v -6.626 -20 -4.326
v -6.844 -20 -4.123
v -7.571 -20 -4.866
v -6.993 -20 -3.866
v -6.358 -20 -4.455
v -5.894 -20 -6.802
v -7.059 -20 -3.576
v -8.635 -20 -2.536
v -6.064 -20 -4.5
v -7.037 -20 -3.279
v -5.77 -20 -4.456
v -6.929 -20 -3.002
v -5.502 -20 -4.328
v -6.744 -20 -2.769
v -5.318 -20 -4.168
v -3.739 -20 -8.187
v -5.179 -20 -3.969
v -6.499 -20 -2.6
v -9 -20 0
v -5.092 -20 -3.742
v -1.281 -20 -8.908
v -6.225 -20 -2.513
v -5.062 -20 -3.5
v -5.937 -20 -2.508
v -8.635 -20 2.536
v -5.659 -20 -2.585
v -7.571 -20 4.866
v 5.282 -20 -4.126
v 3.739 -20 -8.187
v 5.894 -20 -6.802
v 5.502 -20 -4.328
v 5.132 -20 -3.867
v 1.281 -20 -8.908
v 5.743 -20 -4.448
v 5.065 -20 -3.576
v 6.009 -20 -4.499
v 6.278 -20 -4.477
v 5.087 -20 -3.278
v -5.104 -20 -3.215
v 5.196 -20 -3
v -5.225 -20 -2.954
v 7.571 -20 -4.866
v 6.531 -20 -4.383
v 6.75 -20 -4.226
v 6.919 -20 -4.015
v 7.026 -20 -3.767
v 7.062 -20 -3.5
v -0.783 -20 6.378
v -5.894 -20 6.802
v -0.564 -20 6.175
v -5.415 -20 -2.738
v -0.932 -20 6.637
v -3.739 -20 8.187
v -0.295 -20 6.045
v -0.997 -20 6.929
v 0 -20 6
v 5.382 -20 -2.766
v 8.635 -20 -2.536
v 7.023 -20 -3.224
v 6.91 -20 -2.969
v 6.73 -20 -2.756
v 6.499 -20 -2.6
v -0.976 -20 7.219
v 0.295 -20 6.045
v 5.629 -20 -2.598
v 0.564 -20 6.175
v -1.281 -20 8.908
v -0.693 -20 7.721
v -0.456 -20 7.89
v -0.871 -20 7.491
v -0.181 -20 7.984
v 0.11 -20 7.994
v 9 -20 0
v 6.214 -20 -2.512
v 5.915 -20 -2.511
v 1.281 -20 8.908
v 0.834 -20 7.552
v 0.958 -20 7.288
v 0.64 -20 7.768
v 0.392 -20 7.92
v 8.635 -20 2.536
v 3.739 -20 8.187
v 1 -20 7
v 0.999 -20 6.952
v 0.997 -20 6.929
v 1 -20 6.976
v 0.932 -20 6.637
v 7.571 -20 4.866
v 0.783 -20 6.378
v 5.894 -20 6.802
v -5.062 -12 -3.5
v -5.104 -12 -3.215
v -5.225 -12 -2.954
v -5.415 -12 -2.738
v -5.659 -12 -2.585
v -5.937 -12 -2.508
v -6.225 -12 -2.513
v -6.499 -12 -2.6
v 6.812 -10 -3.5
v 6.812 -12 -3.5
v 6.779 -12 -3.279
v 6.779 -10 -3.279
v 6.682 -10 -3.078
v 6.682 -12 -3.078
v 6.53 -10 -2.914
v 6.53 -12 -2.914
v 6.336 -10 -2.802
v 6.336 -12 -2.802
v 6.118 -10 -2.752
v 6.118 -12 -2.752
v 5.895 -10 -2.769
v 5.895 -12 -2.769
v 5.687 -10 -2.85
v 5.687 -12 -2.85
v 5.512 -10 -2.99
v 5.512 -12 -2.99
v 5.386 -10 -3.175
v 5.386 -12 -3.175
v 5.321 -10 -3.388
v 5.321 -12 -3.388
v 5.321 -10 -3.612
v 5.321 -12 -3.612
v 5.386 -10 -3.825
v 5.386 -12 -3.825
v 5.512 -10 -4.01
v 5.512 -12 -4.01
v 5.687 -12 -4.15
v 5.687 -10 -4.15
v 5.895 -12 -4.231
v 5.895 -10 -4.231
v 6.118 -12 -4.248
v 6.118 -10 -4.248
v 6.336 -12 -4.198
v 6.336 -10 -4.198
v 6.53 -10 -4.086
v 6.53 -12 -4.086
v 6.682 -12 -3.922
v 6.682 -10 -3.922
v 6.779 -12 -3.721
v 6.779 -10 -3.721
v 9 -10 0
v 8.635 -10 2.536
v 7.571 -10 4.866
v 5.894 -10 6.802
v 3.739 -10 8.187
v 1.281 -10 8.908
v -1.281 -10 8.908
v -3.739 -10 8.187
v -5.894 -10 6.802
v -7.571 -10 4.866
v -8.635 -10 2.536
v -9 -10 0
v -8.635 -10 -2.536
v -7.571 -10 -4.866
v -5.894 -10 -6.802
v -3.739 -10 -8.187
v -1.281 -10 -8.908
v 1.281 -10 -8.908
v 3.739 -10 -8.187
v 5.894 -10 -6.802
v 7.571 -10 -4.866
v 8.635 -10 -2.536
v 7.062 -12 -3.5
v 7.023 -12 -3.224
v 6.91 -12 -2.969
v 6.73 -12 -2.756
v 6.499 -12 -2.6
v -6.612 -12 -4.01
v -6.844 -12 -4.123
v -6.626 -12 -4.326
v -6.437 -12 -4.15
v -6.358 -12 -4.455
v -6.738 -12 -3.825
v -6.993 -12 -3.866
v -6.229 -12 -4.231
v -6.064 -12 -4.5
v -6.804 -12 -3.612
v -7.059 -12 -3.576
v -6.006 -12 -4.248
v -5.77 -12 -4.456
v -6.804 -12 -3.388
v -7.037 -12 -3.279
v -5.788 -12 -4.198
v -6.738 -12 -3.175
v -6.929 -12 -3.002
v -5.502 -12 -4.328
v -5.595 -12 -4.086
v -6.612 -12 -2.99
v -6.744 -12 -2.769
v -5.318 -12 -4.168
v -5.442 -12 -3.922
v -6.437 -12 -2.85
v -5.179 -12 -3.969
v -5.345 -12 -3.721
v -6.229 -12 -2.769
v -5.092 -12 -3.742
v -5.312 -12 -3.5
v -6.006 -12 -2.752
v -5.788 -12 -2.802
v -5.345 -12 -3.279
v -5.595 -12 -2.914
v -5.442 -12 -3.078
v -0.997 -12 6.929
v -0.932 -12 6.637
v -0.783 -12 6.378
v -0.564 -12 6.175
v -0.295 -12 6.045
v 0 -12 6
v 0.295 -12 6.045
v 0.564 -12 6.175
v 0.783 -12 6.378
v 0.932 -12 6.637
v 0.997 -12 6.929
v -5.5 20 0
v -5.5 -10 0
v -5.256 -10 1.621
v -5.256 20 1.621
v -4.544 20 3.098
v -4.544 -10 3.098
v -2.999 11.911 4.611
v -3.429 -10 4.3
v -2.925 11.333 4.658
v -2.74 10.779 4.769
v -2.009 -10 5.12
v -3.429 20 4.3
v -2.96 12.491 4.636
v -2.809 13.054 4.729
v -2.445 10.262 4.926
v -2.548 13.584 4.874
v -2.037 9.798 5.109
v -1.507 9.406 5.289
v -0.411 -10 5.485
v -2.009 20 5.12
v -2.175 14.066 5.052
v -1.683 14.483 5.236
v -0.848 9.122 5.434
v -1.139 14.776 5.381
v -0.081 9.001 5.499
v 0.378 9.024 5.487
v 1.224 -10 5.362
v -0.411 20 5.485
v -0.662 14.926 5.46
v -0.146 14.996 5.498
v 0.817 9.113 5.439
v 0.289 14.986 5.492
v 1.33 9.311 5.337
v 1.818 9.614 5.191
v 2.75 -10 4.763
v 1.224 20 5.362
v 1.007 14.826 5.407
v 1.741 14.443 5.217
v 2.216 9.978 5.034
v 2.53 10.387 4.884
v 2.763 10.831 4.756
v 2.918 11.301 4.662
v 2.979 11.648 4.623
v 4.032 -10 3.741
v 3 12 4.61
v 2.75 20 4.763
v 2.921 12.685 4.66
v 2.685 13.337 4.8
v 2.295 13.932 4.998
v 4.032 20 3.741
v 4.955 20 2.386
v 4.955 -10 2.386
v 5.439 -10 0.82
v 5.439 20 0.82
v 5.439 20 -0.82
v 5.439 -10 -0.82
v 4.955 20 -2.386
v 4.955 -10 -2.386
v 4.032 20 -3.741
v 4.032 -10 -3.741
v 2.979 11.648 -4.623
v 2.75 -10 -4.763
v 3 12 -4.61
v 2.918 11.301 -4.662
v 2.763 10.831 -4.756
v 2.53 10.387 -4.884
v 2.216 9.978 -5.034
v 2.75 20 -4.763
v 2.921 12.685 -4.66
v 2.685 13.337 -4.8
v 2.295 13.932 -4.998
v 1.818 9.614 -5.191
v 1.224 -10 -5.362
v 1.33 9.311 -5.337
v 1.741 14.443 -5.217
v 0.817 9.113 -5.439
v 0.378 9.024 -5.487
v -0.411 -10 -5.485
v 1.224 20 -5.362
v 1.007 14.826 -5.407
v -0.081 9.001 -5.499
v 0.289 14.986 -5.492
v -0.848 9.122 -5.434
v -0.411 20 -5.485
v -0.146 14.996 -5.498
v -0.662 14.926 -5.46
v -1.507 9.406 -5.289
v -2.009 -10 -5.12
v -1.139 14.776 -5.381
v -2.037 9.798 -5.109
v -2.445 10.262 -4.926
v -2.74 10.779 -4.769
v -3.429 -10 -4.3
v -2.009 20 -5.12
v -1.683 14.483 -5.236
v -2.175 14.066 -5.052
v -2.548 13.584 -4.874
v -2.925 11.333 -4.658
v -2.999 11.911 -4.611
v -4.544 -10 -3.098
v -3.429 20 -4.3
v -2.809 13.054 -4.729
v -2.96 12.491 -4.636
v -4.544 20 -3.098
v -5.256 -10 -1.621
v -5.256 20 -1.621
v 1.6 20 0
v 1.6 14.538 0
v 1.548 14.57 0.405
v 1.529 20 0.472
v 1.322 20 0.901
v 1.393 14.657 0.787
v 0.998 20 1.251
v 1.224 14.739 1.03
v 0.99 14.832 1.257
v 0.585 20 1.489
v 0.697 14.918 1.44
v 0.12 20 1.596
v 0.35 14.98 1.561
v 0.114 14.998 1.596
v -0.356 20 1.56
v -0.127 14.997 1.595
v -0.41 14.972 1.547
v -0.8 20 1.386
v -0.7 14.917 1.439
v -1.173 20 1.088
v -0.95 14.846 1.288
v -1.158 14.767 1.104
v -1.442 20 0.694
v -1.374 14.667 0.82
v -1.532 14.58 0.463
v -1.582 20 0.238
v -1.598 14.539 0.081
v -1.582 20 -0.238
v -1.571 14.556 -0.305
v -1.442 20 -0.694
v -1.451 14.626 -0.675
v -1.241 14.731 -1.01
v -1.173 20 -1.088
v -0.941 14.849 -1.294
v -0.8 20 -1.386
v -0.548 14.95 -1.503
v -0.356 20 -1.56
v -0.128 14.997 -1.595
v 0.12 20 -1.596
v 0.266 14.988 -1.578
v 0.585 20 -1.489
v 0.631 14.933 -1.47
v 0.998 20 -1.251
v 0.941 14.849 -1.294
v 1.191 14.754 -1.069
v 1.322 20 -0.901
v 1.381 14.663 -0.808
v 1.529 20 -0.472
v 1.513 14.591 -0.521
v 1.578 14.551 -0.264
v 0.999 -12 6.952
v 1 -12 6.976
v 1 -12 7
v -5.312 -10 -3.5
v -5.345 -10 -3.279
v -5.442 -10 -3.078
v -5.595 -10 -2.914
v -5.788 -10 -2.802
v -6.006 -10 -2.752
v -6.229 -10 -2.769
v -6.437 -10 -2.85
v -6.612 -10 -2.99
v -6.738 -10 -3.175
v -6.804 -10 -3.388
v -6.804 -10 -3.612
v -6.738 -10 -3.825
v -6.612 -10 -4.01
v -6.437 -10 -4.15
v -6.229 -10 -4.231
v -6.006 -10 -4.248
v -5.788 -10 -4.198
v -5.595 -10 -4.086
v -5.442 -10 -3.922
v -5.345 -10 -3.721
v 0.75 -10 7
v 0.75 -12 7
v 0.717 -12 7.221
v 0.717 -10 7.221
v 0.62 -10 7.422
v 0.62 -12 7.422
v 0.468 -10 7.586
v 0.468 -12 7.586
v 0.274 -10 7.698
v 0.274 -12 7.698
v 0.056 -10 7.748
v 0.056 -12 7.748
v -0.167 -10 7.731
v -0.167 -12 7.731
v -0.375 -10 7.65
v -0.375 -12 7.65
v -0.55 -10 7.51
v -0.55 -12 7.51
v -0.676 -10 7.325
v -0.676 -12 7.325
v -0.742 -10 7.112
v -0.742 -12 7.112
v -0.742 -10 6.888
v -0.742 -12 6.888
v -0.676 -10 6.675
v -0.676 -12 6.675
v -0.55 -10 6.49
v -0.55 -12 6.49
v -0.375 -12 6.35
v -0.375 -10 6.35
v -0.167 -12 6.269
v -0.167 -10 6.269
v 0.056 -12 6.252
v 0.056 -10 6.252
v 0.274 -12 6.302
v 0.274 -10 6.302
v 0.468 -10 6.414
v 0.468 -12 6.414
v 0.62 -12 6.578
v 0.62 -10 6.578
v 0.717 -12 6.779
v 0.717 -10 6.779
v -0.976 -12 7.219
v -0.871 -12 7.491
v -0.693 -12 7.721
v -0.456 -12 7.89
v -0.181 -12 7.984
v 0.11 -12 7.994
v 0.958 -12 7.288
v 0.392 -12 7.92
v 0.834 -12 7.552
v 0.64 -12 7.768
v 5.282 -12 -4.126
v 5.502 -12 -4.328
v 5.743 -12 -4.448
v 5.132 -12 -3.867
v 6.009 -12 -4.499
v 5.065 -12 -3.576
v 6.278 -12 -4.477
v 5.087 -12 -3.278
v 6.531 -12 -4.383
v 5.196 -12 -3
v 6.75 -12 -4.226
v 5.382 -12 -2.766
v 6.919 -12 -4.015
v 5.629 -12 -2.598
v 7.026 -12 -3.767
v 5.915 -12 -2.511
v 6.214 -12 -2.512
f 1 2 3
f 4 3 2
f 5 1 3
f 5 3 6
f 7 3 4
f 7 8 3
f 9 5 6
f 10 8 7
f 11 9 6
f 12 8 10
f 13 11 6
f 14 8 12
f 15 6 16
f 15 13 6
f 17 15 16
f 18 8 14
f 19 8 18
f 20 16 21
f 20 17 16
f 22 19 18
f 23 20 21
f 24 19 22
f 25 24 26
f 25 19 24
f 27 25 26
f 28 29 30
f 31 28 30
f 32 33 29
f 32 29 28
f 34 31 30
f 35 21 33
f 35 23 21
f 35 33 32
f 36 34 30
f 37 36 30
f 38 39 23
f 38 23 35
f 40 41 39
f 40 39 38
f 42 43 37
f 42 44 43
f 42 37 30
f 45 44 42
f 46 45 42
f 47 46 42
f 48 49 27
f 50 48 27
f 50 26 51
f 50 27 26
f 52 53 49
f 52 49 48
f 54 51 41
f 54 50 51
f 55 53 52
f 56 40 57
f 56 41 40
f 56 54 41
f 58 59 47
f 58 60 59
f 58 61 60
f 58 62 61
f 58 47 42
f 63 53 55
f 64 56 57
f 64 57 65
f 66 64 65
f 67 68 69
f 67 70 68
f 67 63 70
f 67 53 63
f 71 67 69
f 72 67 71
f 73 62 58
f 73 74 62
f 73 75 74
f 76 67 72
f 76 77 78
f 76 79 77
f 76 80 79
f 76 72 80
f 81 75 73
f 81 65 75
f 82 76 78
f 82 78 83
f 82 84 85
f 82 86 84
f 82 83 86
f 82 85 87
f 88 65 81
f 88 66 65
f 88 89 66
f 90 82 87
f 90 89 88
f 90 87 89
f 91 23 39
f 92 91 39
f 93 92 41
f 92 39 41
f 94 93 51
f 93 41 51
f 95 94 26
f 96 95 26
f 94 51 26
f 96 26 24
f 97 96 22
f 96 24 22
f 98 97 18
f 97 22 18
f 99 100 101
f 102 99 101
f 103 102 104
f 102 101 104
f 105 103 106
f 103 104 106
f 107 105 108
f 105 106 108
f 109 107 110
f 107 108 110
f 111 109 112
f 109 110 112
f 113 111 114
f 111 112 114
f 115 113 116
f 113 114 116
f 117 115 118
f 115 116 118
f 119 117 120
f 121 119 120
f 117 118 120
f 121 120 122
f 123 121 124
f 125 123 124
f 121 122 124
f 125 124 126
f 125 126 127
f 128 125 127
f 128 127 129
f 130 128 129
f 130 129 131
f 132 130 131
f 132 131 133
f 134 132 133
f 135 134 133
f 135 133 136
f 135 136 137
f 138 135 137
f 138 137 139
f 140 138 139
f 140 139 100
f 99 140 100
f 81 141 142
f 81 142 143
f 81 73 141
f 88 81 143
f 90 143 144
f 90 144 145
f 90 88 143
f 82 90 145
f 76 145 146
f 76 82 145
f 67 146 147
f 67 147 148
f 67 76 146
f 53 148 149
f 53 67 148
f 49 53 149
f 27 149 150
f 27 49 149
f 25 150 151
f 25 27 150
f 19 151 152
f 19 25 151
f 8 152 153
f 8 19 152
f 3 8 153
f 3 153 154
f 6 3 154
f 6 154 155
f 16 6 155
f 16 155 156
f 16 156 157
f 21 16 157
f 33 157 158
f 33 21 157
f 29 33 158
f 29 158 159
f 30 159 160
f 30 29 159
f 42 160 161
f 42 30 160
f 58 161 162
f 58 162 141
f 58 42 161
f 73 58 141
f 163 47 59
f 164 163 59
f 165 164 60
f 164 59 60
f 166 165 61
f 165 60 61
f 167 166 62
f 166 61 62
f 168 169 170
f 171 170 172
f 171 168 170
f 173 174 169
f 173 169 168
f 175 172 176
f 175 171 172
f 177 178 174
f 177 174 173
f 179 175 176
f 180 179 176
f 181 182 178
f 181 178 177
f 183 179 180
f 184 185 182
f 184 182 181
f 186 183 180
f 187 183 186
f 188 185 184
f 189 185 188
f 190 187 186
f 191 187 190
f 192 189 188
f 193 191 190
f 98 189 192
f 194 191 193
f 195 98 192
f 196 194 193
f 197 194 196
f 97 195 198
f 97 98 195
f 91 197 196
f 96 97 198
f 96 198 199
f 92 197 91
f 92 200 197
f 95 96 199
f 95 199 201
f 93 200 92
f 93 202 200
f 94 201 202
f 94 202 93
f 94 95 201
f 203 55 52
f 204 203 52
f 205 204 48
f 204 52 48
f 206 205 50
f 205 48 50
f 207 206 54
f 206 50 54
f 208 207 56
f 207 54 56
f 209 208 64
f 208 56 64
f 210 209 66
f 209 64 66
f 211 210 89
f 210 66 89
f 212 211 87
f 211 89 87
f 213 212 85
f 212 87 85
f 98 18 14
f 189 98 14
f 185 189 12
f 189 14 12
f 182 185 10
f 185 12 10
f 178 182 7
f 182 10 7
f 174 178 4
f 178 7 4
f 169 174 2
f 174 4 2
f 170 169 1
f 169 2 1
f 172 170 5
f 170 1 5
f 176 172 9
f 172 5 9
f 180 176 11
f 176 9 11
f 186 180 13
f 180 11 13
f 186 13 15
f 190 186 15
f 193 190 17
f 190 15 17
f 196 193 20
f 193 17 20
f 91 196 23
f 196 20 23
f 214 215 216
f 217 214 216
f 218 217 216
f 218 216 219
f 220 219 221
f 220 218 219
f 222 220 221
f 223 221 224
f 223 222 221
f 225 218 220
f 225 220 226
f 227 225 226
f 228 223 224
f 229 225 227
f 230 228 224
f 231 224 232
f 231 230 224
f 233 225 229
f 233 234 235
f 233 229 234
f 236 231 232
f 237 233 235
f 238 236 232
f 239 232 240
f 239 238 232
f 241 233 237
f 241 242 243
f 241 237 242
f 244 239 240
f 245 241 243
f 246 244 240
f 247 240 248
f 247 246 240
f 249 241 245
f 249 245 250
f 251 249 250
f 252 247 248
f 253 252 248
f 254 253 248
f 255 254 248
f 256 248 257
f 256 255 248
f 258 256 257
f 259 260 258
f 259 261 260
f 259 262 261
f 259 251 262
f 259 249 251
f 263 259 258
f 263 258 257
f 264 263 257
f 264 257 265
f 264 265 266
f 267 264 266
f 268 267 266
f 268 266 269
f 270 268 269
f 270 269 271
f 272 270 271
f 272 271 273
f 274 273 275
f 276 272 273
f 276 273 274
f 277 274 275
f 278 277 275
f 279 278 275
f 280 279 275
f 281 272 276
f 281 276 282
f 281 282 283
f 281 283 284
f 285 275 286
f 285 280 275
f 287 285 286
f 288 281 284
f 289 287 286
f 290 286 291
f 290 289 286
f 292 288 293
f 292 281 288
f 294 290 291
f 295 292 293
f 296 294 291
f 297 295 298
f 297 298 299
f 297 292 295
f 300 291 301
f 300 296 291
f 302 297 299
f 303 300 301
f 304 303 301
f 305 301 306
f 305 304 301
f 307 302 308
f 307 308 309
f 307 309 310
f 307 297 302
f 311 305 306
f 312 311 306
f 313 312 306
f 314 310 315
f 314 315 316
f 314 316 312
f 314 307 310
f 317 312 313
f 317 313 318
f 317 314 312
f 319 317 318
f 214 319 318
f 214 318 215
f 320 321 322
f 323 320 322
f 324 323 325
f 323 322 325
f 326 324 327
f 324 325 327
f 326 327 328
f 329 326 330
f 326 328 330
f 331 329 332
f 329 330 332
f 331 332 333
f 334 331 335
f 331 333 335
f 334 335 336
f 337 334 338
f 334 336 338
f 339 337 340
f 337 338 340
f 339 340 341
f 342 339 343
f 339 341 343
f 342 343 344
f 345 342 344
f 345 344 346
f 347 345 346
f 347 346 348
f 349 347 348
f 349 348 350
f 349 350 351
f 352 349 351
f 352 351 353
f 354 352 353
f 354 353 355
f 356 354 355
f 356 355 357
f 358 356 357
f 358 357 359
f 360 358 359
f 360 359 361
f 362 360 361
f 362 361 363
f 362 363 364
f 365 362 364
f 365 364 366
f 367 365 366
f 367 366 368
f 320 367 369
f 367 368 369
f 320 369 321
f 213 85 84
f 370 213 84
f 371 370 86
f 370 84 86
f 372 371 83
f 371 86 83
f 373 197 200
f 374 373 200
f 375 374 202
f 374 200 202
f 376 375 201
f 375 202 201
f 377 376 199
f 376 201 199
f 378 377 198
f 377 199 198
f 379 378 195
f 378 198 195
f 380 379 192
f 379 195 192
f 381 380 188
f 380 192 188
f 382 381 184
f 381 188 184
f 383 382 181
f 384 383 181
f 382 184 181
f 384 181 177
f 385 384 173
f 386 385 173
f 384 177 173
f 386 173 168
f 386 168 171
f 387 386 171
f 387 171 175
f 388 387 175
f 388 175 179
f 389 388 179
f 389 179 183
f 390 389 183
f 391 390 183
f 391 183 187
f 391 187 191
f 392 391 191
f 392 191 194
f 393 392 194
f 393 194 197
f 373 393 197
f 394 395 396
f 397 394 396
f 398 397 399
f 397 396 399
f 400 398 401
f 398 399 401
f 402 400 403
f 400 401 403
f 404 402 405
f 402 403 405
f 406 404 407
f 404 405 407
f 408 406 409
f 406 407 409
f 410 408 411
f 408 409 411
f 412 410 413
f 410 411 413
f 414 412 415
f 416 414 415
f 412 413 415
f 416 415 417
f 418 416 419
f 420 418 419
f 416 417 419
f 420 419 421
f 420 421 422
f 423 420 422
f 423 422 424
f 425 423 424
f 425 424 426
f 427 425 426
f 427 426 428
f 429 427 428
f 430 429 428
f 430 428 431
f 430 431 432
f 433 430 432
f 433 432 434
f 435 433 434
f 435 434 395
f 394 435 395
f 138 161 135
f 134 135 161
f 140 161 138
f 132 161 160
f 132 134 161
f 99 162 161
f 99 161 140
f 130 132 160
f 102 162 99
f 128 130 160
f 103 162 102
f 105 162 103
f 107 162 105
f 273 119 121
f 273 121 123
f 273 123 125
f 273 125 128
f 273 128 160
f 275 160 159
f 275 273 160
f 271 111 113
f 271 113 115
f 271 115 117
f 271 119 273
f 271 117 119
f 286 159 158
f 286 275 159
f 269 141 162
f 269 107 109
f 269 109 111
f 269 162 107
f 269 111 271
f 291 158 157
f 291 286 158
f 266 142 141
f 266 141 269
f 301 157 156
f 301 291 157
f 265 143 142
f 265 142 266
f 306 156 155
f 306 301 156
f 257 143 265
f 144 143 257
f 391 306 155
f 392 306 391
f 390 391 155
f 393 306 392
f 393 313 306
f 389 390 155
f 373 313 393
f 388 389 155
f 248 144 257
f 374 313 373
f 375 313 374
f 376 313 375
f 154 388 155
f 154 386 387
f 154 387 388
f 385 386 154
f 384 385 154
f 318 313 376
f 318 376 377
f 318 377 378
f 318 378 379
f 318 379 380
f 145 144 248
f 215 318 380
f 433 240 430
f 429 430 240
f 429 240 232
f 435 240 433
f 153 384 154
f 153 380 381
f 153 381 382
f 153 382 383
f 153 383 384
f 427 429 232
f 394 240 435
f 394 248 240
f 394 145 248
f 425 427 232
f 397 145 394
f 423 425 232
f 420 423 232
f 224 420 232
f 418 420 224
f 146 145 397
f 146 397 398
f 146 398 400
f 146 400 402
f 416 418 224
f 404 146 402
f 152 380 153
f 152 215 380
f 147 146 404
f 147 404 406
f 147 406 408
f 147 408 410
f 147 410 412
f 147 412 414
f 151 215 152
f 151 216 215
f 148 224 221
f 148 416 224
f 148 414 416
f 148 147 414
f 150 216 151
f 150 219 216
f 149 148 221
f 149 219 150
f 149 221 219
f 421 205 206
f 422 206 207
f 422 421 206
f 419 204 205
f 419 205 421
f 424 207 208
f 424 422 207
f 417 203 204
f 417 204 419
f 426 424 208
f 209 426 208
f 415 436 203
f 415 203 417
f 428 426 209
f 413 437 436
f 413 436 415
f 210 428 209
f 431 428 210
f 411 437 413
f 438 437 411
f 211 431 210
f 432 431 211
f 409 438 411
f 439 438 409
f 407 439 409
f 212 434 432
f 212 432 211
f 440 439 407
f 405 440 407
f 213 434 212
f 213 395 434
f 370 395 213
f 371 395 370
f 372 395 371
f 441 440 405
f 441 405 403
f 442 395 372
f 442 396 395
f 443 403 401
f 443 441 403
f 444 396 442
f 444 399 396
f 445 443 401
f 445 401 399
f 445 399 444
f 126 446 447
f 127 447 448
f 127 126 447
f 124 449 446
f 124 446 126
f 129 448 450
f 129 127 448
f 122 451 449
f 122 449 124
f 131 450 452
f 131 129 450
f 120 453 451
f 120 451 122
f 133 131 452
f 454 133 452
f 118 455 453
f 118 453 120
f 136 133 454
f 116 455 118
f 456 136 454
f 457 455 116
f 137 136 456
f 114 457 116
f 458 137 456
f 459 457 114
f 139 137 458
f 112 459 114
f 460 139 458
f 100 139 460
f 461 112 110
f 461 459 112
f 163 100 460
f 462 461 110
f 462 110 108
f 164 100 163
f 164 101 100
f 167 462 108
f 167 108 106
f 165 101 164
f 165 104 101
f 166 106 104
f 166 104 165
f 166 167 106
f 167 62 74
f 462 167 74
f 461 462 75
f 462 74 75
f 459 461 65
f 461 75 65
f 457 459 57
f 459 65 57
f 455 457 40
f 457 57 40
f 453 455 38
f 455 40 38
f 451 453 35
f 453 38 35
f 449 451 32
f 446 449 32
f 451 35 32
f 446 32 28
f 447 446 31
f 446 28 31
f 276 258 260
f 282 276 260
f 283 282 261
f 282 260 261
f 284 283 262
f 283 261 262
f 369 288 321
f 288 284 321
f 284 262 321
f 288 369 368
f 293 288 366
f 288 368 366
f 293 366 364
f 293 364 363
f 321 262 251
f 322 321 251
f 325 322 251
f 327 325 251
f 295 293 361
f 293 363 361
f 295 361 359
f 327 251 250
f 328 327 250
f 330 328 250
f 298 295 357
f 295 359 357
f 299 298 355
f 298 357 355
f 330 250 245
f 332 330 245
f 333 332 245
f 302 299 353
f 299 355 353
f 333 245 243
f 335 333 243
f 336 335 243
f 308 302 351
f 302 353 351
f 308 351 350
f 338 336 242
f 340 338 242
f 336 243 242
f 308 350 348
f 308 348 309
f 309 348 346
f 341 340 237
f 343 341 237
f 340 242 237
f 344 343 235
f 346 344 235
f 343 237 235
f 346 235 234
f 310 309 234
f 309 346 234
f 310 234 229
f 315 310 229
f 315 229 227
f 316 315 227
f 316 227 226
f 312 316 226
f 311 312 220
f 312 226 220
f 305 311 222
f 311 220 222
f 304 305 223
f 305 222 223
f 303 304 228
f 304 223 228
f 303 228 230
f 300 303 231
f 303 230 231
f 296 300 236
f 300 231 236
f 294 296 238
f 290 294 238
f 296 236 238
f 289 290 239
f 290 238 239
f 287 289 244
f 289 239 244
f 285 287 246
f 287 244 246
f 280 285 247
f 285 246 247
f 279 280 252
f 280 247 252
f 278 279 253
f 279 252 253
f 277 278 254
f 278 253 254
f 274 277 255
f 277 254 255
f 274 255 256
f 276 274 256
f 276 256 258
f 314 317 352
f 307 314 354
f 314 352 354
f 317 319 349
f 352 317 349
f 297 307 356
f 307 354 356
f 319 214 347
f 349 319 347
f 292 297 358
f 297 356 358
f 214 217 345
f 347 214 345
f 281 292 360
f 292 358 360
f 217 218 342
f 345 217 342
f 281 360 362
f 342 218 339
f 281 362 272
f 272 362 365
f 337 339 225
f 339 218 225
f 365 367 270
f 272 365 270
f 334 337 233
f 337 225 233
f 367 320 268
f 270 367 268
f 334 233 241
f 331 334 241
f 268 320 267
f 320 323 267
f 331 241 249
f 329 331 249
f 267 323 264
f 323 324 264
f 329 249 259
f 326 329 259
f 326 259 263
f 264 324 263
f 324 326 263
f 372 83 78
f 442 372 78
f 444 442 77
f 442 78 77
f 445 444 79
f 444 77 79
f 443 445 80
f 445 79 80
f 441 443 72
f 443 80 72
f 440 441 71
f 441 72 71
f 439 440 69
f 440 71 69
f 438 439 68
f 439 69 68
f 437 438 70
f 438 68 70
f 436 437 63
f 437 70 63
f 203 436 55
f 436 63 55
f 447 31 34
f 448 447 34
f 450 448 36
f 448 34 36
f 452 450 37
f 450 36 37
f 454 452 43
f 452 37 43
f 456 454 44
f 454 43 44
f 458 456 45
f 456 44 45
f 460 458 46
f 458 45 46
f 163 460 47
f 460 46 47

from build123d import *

# Parameters (mm, degrees)
F0_R      = 9
F1_DEPTH  = 20
F2_R      = 0.75
F3_DEPTH  = 8
F4_R      = 9
F4_R_2    = 5.5
F5_DEPTH  = 30
F6_DEPTH  = 10
F7_R      = 3
F8_DEPTH  = 12.5
F10_D     = 3.2
F10_DEPTH = 7.25
F10_TIP   = 0.9613769904


with BuildPart() as f1:
    # F0 (on Front) → F1 (new body, symmetric)
    with BuildSketch(Plane.XZ):
        Circle(F0_R)
    extrude(amount=F1_DEPTH, both=True)

    # F2 (on face) → F3 (cut)
    with BuildSketch(Plane.XZ.offset(20)):
        with BuildLine():
            ThreePointArc((1, 7), (-0.0357371137, 7.9993612253), (-0.9974457174, 6.9285714286))
            ThreePointArc((-0.9974457174, 6.9285714286), (0, 6), (0.9974457174, 6.9285714286))
            ThreePointArc((0.9974457174, 6.9285714286), (0.9993612253, 6.9642628863), (1, 7))
        make_face()
        with Locations((0, 7)):
            Circle(F2_R, mode=Mode.SUBTRACT)
        with BuildLine():
            ThreePointArc((-5.0621778265, -3.5), (-5.5315479655, -2.6523963481), (-6.4990417278, -2.6004723841))
            ThreePointArc((-6.4990417278, -2.6004723841), (-6.9282032303, -4), (-5.5015960104, -4.3280990445))
            ThreePointArc((-5.5015960104, -4.3280990445), (-5.178837061, -3.9687313644), (-5.0621778265, -3.5))
        make_face()
        with Locations((-6.0621778265, -3.5)):
            Circle(F2_R, mode=Mode.SUBTRACT)
        with BuildLine():
            ThreePointArc((7.0621778265, -3.5), (6.9097814784, -2.969370139), (6.4990417278, -2.6004723841))
            ThreePointArc((6.4990417278, -2.6004723841), (5.1961524227, -3), (5.5015960104, -4.3280990445))
            ThreePointArc((5.5015960104, -4.3280990445), (6.5309091909, -4.3833407655), (7.0621778265, -3.5))
        make_face()
        with Locations((6.0621778265, -3.5)):
            Circle(F2_R, mode=Mode.SUBTRACT)
    extrude(amount=-F3_DEPTH, mode=Mode.SUBTRACT)

    # F4 (on face) → F5 (cut)
    with BuildSketch(Plane(origin=(0, 20, 0), x_dir=(-1, 0, 0), z_dir=(0, 1, 0))):
        Circle(F4_R)
        Circle(F4_R_2, mode=Mode.SUBTRACT)
    extrude(amount=-F5_DEPTH, mode=Mode.SUBTRACT)

    # F2 (on face) → F6 (cut)
    with BuildSketch(Plane.XZ.offset(20)):
        with Locations((-6.0621778265, -3.5)):
            Circle(F2_R)
        with Locations((0, 7)):
            Circle(F2_R)
        with Locations((6.0621778265, -3.5)):
            Circle(F2_R)
    extrude(amount=-F6_DEPTH, mode=Mode.SUBTRACT)

    # F7 (on Top) → F8 (cut, symmetric)
    with BuildSketch(Plane.XY):
        with Locations((0, 12)):
            Circle(F7_R)
    extrude(amount=F8_DEPTH, both=True, mode=Mode.SUBTRACT)

    # F10
    with Locations(Plane(origin=(0, 20, 0), x_dir=(-1, 0, 0), z_dir=(0, 1, 0))):
        with Locations((0, 0)):
            Hole(F10_D / 2, depth=F10_DEPTH)
            with Locations((0, 0, -(F10_DEPTH + F10_TIP / 2))):  # 118° drill point
                Cone(0, F10_D / 2, F10_TIP, mode=Mode.SUBTRACT)


solid = f1.part
